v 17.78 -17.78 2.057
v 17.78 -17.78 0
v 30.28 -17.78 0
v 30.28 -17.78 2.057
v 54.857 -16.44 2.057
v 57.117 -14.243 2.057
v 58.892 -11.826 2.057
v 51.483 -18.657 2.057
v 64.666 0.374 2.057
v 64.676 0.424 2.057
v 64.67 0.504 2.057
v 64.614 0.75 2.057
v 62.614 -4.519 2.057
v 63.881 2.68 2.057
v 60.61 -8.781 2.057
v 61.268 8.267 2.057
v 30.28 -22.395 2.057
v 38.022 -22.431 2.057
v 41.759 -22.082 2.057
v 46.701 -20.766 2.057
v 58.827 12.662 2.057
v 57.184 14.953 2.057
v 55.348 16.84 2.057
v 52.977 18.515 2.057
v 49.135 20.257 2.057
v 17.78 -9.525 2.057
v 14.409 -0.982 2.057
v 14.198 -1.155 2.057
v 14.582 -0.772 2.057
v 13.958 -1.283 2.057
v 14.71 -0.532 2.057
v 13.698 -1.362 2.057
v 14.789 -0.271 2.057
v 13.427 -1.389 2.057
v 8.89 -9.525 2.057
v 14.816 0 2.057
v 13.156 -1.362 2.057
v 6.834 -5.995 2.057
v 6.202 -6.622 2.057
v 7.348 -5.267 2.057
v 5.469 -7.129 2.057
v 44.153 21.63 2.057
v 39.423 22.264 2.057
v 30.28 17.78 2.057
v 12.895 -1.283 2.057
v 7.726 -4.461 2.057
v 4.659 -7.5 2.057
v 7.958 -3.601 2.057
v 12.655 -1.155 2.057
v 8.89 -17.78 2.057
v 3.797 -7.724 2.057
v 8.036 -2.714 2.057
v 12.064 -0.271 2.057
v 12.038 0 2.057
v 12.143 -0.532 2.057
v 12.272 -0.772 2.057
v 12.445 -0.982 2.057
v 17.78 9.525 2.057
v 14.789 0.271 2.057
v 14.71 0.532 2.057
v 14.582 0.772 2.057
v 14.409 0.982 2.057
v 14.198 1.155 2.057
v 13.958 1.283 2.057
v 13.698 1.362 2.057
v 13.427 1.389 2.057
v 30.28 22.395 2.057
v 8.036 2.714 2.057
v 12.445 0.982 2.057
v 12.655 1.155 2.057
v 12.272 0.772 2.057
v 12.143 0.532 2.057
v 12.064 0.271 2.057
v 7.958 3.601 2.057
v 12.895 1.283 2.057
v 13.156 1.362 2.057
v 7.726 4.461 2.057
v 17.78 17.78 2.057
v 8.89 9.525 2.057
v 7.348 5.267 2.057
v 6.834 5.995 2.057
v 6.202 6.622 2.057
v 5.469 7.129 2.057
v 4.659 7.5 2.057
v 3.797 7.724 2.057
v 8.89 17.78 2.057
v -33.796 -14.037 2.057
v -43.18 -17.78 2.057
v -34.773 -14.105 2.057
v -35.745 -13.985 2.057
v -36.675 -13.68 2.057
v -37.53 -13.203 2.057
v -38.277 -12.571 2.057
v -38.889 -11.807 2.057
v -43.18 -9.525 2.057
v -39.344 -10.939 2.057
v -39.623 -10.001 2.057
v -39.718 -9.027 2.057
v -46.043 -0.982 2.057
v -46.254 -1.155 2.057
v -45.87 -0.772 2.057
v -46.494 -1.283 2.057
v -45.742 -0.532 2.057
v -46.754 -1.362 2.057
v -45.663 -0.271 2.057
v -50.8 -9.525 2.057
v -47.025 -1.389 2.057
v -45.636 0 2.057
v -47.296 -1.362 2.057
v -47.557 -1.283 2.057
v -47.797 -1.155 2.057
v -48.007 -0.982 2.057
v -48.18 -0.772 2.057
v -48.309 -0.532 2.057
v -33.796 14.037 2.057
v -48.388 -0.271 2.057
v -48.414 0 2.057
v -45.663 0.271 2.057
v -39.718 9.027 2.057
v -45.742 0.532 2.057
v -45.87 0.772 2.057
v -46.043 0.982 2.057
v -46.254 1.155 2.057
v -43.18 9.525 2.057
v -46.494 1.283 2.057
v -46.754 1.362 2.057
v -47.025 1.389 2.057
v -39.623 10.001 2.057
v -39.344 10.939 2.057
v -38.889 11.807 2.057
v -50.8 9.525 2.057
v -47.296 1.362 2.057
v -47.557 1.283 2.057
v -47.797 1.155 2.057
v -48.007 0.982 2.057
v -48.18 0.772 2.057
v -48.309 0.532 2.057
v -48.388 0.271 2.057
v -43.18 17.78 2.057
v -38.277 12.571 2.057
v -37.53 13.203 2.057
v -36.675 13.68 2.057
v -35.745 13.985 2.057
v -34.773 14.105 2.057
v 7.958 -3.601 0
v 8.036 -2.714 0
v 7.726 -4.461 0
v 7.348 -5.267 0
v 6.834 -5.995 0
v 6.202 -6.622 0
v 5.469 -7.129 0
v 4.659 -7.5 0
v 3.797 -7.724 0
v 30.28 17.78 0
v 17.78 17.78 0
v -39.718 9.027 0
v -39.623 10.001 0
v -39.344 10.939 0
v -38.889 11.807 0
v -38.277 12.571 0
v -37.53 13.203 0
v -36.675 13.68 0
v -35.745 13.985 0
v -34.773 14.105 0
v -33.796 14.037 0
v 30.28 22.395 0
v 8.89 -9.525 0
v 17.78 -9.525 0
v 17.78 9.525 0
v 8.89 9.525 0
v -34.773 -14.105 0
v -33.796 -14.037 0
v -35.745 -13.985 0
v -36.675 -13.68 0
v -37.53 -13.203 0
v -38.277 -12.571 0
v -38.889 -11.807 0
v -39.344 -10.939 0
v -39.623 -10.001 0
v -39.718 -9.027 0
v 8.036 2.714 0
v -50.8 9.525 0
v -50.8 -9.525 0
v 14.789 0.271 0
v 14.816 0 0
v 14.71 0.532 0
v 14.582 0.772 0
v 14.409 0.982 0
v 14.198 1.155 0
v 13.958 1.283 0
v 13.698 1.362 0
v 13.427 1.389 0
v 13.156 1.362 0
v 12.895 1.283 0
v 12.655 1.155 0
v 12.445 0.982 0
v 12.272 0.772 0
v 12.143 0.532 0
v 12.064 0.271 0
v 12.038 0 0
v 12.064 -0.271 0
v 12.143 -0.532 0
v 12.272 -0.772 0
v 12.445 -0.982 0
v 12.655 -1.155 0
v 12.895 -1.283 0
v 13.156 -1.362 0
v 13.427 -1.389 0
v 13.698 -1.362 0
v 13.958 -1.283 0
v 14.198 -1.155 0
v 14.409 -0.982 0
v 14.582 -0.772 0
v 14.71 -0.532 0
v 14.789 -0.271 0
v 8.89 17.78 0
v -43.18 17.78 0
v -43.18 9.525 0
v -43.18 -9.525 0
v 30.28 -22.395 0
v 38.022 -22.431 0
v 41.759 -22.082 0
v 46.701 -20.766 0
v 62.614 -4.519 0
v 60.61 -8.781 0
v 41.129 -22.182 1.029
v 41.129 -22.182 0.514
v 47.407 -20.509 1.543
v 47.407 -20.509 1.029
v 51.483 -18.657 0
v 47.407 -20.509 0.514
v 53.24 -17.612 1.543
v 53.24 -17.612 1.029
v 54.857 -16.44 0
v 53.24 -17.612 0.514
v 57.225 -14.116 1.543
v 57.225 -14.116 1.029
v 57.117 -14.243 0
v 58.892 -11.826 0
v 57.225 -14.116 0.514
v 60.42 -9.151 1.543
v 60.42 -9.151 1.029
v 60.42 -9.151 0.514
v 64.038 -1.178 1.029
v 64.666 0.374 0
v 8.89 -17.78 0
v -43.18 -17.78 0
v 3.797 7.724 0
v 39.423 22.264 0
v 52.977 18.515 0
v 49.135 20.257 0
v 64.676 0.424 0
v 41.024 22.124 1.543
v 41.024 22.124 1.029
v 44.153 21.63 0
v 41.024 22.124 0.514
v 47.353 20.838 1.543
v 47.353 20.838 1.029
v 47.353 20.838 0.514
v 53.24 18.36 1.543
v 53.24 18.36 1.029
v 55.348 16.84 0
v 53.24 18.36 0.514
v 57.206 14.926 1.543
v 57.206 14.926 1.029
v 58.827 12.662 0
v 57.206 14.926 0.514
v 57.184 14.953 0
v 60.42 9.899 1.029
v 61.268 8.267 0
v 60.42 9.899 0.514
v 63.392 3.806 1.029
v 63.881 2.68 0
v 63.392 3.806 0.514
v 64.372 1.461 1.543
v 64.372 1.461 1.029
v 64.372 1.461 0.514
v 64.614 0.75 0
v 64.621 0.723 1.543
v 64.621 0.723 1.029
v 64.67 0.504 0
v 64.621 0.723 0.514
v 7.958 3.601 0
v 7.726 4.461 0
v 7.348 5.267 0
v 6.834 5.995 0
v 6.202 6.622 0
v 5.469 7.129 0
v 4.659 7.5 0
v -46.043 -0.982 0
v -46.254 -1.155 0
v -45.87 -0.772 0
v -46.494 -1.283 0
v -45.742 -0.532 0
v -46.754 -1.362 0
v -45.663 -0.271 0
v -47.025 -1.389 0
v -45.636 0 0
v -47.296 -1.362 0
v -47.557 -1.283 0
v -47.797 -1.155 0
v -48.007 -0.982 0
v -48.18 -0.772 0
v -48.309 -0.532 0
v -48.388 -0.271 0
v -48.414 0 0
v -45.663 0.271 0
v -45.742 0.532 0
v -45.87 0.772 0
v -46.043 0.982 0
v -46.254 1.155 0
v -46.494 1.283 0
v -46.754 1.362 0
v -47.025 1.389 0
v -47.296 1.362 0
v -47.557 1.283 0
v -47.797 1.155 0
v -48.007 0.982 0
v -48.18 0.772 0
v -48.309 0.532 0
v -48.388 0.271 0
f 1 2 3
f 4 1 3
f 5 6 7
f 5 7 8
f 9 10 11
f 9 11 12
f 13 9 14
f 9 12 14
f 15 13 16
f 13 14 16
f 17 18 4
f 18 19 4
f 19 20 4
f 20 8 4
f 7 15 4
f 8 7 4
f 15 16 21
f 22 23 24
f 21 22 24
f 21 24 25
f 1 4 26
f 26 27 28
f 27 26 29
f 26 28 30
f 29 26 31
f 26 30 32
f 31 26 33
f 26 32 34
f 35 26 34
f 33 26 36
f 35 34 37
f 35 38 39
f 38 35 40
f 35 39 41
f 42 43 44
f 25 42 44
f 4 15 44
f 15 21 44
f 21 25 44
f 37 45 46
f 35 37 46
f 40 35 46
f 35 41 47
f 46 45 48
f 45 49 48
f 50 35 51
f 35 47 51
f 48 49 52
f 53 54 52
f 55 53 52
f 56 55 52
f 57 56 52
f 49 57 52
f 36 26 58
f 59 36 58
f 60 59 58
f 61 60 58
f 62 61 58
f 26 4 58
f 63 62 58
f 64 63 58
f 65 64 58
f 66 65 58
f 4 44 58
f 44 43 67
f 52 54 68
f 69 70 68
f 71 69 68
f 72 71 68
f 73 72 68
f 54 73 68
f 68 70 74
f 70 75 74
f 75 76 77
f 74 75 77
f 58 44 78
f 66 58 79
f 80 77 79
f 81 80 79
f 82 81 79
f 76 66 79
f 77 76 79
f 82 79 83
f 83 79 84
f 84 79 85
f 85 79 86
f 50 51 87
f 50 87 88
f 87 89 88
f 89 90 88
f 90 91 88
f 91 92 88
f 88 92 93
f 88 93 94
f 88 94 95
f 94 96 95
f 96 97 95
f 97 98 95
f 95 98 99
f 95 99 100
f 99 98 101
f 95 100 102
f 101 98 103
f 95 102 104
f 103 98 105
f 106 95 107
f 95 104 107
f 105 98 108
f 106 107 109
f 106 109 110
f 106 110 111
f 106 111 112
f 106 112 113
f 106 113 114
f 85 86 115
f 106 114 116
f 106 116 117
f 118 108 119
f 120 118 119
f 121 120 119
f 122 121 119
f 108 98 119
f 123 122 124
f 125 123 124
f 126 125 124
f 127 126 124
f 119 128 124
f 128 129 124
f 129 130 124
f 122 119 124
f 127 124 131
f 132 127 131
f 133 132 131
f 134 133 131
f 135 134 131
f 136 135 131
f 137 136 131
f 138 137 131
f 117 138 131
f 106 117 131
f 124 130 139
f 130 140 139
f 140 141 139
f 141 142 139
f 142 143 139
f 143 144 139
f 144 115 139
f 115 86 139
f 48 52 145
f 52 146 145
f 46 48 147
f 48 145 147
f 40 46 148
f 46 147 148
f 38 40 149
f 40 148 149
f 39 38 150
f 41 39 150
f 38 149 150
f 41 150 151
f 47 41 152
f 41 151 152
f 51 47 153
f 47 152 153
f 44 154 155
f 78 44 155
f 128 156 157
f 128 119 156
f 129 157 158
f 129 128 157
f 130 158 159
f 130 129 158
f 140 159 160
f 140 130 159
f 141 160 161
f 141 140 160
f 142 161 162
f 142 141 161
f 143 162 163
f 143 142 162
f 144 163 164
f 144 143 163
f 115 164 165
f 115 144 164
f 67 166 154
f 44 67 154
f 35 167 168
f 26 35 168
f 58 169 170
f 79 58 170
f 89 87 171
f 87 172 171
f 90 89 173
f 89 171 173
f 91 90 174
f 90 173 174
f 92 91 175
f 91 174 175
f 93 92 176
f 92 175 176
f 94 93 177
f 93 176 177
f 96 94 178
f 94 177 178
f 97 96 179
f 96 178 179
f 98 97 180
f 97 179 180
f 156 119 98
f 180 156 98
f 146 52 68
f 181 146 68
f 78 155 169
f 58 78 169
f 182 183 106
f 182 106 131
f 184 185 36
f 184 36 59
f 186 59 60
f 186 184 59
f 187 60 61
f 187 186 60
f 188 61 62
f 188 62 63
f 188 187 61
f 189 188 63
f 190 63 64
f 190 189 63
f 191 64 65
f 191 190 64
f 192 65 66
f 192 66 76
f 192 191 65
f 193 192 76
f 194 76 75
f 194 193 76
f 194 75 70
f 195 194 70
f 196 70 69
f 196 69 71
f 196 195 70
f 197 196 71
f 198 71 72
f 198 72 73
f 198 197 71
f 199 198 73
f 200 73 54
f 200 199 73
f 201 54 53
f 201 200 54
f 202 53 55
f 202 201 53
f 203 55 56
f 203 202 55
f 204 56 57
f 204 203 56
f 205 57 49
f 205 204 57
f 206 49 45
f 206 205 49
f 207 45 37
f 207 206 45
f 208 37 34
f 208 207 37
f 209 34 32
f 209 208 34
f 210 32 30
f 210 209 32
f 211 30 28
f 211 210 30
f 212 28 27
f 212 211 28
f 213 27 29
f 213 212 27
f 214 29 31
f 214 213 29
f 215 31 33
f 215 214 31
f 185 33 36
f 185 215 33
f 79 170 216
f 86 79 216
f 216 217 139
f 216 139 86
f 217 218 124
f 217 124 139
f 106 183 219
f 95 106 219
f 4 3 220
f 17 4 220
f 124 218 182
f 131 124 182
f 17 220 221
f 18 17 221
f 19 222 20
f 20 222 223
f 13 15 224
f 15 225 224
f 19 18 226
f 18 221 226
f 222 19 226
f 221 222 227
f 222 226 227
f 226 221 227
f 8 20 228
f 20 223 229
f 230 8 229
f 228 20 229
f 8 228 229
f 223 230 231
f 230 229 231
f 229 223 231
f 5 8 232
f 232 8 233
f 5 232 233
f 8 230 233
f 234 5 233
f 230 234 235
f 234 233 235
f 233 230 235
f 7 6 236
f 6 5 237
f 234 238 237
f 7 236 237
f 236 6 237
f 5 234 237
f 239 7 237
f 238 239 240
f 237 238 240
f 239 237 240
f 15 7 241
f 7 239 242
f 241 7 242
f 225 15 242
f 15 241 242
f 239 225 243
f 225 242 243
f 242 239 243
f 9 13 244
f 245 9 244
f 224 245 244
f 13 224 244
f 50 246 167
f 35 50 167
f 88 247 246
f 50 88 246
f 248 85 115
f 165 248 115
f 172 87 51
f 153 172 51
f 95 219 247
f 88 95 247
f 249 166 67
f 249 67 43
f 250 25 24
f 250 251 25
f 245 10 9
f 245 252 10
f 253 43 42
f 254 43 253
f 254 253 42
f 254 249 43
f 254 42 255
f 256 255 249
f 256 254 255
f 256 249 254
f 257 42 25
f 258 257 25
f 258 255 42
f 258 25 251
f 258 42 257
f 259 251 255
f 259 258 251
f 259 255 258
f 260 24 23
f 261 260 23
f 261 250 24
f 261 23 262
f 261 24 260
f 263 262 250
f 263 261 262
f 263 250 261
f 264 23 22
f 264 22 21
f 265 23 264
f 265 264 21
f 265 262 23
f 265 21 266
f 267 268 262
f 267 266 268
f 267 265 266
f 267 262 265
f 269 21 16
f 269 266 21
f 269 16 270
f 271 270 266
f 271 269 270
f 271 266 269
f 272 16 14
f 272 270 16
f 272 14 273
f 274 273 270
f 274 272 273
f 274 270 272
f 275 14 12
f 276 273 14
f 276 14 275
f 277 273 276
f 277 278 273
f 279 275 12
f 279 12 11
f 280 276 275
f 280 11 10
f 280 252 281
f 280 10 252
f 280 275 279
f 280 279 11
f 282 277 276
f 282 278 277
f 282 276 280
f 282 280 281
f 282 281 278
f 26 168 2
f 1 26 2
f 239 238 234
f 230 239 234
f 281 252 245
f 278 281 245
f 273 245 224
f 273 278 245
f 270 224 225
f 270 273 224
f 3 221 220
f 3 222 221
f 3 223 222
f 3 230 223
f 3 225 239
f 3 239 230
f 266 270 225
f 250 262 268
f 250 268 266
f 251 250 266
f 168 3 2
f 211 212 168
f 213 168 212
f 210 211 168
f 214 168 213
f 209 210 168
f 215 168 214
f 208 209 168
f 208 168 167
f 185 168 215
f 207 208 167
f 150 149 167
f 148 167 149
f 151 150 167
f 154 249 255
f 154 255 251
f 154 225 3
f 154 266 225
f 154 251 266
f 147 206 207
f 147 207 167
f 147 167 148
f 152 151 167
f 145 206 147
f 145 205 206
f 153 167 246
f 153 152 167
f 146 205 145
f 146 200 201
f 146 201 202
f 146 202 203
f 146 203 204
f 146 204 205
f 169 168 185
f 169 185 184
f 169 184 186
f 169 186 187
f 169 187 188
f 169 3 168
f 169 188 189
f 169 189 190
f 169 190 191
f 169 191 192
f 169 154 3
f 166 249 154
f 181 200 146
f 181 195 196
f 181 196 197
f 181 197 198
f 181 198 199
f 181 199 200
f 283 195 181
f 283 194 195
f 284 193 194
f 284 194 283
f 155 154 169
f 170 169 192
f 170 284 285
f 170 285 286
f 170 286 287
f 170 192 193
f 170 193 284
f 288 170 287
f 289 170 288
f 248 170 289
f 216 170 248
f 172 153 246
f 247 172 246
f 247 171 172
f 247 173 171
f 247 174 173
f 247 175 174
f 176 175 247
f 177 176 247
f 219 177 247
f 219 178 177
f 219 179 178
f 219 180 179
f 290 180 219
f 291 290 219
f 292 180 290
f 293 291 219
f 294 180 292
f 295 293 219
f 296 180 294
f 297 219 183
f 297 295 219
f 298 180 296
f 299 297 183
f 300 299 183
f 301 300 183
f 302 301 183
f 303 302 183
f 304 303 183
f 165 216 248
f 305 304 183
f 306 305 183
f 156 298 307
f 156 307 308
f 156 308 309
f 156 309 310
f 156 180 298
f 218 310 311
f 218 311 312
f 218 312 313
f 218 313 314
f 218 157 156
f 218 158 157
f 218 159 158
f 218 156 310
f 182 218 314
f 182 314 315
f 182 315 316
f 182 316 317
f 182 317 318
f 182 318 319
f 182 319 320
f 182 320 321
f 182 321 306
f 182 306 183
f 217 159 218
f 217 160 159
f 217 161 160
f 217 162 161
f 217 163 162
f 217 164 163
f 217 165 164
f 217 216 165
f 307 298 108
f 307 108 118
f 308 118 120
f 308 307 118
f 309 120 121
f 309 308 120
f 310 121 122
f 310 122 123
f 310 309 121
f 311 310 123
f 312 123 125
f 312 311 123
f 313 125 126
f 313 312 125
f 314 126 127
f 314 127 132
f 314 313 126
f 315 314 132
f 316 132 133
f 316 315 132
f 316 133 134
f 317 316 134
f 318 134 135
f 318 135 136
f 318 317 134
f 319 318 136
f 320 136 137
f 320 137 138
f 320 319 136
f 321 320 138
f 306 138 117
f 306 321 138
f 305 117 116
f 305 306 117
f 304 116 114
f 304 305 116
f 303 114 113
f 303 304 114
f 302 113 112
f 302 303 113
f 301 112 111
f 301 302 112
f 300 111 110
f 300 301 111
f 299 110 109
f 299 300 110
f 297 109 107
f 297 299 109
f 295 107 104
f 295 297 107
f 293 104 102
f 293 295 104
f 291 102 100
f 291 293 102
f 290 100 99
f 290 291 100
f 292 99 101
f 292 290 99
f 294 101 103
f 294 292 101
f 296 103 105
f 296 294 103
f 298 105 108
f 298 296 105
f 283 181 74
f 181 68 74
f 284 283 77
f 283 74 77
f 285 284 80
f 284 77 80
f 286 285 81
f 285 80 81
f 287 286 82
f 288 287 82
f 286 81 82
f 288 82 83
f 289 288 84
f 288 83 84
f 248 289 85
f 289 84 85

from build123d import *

# Parameters (mm, degrees)
F0_W     = 41.91
F0_H     = 19.05
F0_R     = 1.3890625
F0_W_2   = 52.07
F0_H_2   = 8.255
F0_W_3   = 7.62
F1_DEPTH = 2.0574
F3_DEPTH = 2.0574
F5_DEPTH = 12.7
F6_R     = 5.08


with BuildPart() as f1:
    # F0 (on Top) → F1 (new body)
    with BuildSketch(Plane.XY):
        with Locations((29.845, 0)):
            Rectangle(F0_W, F0_H)
        with Locations((13.4267662017, 0)):
            Circle(F0_R, mode=Mode.SUBTRACT)
        with Locations((-17.145, -13.6525)):
            Rectangle(F0_W_2, F0_H_2)
        with Locations((-17.145, 0)):
            Rectangle(F0_W_2, F0_H)
        with Locations((-46.99, 0)):
            Rectangle(F0_W_3, F0_H)
        with Locations((-47.0252337983, 0)):
            Circle(F0_R, mode=Mode.SUBTRACT)
        with Locations((-17.145, 13.6525)):
            Rectangle(F0_W_2, F0_H_2)
    extrude(amount=F1_DEPTH)

    # F2 (on Top) → F3 (join)
    with BuildSketch(Plane.XY):
        with BuildLine():
            add(Edge.make_bspline(
                [(30.2796192753, 22.3951932201), (34.47761225, 22.2355197105), (40.54497388, 22.8560402759), (54.3807379627, 19.1979683007), (60.0879375817, 11.4498849698), (64.8467251166, 0.7216945038), (64.6662684157, 0.3740880638)],
                knots=[0, 0, 0, 0, 0.2383917442, 0.4983697633, 0.7405972723, 0.9754210457, 0.9754210457, 0.9754210457, 0.9754210457], degree=3))
            Line((30.2796192753, 22.3951932201), (30.2796192753, 17.78))
            Line((30.2796192753, 17.78), (17.78, 17.78))
            Line((17.78, 17.78), (17.78, 0))
            Line((17.78, 0), (17.78, -17.78))
            Line((17.78, -17.78), (30.2796192753, -17.78))
            Line((30.2796192753, -17.78), (30.2796192753, -22.3951932201))
            add(Edge.make_bspline(
                [(30.2796192753, -22.3951932201), (34.4859564493, -22.2352023333), (40.7613792543, -23.2344876139), (54.2509767666, -18.1718013245), (60.245134847, -10.8159221732), (64.5606245101, 0.1067004431), (64.6662684157, 0.3740880638)],
                knots=[0, 0, 0, 0, 0.2388655869, 0.4997646762, 0.7413186088, 0.9754893938, 0.9754893938, 0.9754893938, 0.9754893938], degree=3))
        make_face()
        with BuildLine():
            add(Edge.make_bspline(
                [(64.6662684157, 0.3740880638), (64.6773261408, 0.4020754691), (64.6662684157, 0.3740880638), (64.5520137623, 0.3740880638)],
                knots=[0.9754893938, 0.9754893938, 0.9754893938, 0.9754893938, 1, 1, 1, 1], degree=3))
            add(Edge.make_bspline(
                [(64.6662684157, 0.3740880638), (64.6473800513, 0.3377041719), (64.6008511396, 0.3553676853), (64.5520137623, 0.3740880638)],
                knots=[0.9754210457, 0.9754210457, 0.9754210457, 0.9754210457, 1, 1, 1, 1], degree=3))
        make_face(mode=Mode.SUBTRACT)
        with BuildLine():
            add(Edge.make_bspline(
                [(64.6662684157, 0.3740880638), (64.6473800513, 0.3377041719), (64.6008511396, 0.3553676853), (64.5520137623, 0.3740880638)],
                knots=[0.9754210457, 0.9754210457, 0.9754210457, 0.9754210457, 1, 1, 1, 1], degree=3))
            add(Edge.make_bspline(
                [(64.6662684157, 0.3740880638), (64.6773261408, 0.4020754691), (64.6662684157, 0.3740880638), (64.5520137623, 0.3740880638)],
                knots=[0.9754893938, 0.9754893938, 0.9754893938, 0.9754893938, 1, 1, 1, 1], degree=3))
        make_face()
    extrude(amount=F3_DEPTH)

    # F4 (on Top) → F5 (cut, symmetric)
    with BuildSketch(Plane.XY):
        Polygon((8.0361636356, -7.0120524615), (8.0361636356, 0), (8.0361636356, 7.0120524615), (-39.717592299, 15.0308534503), (-39.717592299, 0), (-39.717592299, -15.0308534503), align=None)
    extrude(amount=F5_DEPTH, both=True, mode=Mode.SUBTRACT)

    # F6
    f6_edges = [f1.edges().sort_by_distance(p)[0] for p in [
        (-39.717592, 15.030853, 1.0287),
        (8.036164, 7.012052, 1.0287),
        (8.036164, -7.012052, 1.0287),
        (-39.717592, -15.030853, 1.0287),
    ]]
    fillet(f6_edges, radius=F6_R)


solid = f1.part
